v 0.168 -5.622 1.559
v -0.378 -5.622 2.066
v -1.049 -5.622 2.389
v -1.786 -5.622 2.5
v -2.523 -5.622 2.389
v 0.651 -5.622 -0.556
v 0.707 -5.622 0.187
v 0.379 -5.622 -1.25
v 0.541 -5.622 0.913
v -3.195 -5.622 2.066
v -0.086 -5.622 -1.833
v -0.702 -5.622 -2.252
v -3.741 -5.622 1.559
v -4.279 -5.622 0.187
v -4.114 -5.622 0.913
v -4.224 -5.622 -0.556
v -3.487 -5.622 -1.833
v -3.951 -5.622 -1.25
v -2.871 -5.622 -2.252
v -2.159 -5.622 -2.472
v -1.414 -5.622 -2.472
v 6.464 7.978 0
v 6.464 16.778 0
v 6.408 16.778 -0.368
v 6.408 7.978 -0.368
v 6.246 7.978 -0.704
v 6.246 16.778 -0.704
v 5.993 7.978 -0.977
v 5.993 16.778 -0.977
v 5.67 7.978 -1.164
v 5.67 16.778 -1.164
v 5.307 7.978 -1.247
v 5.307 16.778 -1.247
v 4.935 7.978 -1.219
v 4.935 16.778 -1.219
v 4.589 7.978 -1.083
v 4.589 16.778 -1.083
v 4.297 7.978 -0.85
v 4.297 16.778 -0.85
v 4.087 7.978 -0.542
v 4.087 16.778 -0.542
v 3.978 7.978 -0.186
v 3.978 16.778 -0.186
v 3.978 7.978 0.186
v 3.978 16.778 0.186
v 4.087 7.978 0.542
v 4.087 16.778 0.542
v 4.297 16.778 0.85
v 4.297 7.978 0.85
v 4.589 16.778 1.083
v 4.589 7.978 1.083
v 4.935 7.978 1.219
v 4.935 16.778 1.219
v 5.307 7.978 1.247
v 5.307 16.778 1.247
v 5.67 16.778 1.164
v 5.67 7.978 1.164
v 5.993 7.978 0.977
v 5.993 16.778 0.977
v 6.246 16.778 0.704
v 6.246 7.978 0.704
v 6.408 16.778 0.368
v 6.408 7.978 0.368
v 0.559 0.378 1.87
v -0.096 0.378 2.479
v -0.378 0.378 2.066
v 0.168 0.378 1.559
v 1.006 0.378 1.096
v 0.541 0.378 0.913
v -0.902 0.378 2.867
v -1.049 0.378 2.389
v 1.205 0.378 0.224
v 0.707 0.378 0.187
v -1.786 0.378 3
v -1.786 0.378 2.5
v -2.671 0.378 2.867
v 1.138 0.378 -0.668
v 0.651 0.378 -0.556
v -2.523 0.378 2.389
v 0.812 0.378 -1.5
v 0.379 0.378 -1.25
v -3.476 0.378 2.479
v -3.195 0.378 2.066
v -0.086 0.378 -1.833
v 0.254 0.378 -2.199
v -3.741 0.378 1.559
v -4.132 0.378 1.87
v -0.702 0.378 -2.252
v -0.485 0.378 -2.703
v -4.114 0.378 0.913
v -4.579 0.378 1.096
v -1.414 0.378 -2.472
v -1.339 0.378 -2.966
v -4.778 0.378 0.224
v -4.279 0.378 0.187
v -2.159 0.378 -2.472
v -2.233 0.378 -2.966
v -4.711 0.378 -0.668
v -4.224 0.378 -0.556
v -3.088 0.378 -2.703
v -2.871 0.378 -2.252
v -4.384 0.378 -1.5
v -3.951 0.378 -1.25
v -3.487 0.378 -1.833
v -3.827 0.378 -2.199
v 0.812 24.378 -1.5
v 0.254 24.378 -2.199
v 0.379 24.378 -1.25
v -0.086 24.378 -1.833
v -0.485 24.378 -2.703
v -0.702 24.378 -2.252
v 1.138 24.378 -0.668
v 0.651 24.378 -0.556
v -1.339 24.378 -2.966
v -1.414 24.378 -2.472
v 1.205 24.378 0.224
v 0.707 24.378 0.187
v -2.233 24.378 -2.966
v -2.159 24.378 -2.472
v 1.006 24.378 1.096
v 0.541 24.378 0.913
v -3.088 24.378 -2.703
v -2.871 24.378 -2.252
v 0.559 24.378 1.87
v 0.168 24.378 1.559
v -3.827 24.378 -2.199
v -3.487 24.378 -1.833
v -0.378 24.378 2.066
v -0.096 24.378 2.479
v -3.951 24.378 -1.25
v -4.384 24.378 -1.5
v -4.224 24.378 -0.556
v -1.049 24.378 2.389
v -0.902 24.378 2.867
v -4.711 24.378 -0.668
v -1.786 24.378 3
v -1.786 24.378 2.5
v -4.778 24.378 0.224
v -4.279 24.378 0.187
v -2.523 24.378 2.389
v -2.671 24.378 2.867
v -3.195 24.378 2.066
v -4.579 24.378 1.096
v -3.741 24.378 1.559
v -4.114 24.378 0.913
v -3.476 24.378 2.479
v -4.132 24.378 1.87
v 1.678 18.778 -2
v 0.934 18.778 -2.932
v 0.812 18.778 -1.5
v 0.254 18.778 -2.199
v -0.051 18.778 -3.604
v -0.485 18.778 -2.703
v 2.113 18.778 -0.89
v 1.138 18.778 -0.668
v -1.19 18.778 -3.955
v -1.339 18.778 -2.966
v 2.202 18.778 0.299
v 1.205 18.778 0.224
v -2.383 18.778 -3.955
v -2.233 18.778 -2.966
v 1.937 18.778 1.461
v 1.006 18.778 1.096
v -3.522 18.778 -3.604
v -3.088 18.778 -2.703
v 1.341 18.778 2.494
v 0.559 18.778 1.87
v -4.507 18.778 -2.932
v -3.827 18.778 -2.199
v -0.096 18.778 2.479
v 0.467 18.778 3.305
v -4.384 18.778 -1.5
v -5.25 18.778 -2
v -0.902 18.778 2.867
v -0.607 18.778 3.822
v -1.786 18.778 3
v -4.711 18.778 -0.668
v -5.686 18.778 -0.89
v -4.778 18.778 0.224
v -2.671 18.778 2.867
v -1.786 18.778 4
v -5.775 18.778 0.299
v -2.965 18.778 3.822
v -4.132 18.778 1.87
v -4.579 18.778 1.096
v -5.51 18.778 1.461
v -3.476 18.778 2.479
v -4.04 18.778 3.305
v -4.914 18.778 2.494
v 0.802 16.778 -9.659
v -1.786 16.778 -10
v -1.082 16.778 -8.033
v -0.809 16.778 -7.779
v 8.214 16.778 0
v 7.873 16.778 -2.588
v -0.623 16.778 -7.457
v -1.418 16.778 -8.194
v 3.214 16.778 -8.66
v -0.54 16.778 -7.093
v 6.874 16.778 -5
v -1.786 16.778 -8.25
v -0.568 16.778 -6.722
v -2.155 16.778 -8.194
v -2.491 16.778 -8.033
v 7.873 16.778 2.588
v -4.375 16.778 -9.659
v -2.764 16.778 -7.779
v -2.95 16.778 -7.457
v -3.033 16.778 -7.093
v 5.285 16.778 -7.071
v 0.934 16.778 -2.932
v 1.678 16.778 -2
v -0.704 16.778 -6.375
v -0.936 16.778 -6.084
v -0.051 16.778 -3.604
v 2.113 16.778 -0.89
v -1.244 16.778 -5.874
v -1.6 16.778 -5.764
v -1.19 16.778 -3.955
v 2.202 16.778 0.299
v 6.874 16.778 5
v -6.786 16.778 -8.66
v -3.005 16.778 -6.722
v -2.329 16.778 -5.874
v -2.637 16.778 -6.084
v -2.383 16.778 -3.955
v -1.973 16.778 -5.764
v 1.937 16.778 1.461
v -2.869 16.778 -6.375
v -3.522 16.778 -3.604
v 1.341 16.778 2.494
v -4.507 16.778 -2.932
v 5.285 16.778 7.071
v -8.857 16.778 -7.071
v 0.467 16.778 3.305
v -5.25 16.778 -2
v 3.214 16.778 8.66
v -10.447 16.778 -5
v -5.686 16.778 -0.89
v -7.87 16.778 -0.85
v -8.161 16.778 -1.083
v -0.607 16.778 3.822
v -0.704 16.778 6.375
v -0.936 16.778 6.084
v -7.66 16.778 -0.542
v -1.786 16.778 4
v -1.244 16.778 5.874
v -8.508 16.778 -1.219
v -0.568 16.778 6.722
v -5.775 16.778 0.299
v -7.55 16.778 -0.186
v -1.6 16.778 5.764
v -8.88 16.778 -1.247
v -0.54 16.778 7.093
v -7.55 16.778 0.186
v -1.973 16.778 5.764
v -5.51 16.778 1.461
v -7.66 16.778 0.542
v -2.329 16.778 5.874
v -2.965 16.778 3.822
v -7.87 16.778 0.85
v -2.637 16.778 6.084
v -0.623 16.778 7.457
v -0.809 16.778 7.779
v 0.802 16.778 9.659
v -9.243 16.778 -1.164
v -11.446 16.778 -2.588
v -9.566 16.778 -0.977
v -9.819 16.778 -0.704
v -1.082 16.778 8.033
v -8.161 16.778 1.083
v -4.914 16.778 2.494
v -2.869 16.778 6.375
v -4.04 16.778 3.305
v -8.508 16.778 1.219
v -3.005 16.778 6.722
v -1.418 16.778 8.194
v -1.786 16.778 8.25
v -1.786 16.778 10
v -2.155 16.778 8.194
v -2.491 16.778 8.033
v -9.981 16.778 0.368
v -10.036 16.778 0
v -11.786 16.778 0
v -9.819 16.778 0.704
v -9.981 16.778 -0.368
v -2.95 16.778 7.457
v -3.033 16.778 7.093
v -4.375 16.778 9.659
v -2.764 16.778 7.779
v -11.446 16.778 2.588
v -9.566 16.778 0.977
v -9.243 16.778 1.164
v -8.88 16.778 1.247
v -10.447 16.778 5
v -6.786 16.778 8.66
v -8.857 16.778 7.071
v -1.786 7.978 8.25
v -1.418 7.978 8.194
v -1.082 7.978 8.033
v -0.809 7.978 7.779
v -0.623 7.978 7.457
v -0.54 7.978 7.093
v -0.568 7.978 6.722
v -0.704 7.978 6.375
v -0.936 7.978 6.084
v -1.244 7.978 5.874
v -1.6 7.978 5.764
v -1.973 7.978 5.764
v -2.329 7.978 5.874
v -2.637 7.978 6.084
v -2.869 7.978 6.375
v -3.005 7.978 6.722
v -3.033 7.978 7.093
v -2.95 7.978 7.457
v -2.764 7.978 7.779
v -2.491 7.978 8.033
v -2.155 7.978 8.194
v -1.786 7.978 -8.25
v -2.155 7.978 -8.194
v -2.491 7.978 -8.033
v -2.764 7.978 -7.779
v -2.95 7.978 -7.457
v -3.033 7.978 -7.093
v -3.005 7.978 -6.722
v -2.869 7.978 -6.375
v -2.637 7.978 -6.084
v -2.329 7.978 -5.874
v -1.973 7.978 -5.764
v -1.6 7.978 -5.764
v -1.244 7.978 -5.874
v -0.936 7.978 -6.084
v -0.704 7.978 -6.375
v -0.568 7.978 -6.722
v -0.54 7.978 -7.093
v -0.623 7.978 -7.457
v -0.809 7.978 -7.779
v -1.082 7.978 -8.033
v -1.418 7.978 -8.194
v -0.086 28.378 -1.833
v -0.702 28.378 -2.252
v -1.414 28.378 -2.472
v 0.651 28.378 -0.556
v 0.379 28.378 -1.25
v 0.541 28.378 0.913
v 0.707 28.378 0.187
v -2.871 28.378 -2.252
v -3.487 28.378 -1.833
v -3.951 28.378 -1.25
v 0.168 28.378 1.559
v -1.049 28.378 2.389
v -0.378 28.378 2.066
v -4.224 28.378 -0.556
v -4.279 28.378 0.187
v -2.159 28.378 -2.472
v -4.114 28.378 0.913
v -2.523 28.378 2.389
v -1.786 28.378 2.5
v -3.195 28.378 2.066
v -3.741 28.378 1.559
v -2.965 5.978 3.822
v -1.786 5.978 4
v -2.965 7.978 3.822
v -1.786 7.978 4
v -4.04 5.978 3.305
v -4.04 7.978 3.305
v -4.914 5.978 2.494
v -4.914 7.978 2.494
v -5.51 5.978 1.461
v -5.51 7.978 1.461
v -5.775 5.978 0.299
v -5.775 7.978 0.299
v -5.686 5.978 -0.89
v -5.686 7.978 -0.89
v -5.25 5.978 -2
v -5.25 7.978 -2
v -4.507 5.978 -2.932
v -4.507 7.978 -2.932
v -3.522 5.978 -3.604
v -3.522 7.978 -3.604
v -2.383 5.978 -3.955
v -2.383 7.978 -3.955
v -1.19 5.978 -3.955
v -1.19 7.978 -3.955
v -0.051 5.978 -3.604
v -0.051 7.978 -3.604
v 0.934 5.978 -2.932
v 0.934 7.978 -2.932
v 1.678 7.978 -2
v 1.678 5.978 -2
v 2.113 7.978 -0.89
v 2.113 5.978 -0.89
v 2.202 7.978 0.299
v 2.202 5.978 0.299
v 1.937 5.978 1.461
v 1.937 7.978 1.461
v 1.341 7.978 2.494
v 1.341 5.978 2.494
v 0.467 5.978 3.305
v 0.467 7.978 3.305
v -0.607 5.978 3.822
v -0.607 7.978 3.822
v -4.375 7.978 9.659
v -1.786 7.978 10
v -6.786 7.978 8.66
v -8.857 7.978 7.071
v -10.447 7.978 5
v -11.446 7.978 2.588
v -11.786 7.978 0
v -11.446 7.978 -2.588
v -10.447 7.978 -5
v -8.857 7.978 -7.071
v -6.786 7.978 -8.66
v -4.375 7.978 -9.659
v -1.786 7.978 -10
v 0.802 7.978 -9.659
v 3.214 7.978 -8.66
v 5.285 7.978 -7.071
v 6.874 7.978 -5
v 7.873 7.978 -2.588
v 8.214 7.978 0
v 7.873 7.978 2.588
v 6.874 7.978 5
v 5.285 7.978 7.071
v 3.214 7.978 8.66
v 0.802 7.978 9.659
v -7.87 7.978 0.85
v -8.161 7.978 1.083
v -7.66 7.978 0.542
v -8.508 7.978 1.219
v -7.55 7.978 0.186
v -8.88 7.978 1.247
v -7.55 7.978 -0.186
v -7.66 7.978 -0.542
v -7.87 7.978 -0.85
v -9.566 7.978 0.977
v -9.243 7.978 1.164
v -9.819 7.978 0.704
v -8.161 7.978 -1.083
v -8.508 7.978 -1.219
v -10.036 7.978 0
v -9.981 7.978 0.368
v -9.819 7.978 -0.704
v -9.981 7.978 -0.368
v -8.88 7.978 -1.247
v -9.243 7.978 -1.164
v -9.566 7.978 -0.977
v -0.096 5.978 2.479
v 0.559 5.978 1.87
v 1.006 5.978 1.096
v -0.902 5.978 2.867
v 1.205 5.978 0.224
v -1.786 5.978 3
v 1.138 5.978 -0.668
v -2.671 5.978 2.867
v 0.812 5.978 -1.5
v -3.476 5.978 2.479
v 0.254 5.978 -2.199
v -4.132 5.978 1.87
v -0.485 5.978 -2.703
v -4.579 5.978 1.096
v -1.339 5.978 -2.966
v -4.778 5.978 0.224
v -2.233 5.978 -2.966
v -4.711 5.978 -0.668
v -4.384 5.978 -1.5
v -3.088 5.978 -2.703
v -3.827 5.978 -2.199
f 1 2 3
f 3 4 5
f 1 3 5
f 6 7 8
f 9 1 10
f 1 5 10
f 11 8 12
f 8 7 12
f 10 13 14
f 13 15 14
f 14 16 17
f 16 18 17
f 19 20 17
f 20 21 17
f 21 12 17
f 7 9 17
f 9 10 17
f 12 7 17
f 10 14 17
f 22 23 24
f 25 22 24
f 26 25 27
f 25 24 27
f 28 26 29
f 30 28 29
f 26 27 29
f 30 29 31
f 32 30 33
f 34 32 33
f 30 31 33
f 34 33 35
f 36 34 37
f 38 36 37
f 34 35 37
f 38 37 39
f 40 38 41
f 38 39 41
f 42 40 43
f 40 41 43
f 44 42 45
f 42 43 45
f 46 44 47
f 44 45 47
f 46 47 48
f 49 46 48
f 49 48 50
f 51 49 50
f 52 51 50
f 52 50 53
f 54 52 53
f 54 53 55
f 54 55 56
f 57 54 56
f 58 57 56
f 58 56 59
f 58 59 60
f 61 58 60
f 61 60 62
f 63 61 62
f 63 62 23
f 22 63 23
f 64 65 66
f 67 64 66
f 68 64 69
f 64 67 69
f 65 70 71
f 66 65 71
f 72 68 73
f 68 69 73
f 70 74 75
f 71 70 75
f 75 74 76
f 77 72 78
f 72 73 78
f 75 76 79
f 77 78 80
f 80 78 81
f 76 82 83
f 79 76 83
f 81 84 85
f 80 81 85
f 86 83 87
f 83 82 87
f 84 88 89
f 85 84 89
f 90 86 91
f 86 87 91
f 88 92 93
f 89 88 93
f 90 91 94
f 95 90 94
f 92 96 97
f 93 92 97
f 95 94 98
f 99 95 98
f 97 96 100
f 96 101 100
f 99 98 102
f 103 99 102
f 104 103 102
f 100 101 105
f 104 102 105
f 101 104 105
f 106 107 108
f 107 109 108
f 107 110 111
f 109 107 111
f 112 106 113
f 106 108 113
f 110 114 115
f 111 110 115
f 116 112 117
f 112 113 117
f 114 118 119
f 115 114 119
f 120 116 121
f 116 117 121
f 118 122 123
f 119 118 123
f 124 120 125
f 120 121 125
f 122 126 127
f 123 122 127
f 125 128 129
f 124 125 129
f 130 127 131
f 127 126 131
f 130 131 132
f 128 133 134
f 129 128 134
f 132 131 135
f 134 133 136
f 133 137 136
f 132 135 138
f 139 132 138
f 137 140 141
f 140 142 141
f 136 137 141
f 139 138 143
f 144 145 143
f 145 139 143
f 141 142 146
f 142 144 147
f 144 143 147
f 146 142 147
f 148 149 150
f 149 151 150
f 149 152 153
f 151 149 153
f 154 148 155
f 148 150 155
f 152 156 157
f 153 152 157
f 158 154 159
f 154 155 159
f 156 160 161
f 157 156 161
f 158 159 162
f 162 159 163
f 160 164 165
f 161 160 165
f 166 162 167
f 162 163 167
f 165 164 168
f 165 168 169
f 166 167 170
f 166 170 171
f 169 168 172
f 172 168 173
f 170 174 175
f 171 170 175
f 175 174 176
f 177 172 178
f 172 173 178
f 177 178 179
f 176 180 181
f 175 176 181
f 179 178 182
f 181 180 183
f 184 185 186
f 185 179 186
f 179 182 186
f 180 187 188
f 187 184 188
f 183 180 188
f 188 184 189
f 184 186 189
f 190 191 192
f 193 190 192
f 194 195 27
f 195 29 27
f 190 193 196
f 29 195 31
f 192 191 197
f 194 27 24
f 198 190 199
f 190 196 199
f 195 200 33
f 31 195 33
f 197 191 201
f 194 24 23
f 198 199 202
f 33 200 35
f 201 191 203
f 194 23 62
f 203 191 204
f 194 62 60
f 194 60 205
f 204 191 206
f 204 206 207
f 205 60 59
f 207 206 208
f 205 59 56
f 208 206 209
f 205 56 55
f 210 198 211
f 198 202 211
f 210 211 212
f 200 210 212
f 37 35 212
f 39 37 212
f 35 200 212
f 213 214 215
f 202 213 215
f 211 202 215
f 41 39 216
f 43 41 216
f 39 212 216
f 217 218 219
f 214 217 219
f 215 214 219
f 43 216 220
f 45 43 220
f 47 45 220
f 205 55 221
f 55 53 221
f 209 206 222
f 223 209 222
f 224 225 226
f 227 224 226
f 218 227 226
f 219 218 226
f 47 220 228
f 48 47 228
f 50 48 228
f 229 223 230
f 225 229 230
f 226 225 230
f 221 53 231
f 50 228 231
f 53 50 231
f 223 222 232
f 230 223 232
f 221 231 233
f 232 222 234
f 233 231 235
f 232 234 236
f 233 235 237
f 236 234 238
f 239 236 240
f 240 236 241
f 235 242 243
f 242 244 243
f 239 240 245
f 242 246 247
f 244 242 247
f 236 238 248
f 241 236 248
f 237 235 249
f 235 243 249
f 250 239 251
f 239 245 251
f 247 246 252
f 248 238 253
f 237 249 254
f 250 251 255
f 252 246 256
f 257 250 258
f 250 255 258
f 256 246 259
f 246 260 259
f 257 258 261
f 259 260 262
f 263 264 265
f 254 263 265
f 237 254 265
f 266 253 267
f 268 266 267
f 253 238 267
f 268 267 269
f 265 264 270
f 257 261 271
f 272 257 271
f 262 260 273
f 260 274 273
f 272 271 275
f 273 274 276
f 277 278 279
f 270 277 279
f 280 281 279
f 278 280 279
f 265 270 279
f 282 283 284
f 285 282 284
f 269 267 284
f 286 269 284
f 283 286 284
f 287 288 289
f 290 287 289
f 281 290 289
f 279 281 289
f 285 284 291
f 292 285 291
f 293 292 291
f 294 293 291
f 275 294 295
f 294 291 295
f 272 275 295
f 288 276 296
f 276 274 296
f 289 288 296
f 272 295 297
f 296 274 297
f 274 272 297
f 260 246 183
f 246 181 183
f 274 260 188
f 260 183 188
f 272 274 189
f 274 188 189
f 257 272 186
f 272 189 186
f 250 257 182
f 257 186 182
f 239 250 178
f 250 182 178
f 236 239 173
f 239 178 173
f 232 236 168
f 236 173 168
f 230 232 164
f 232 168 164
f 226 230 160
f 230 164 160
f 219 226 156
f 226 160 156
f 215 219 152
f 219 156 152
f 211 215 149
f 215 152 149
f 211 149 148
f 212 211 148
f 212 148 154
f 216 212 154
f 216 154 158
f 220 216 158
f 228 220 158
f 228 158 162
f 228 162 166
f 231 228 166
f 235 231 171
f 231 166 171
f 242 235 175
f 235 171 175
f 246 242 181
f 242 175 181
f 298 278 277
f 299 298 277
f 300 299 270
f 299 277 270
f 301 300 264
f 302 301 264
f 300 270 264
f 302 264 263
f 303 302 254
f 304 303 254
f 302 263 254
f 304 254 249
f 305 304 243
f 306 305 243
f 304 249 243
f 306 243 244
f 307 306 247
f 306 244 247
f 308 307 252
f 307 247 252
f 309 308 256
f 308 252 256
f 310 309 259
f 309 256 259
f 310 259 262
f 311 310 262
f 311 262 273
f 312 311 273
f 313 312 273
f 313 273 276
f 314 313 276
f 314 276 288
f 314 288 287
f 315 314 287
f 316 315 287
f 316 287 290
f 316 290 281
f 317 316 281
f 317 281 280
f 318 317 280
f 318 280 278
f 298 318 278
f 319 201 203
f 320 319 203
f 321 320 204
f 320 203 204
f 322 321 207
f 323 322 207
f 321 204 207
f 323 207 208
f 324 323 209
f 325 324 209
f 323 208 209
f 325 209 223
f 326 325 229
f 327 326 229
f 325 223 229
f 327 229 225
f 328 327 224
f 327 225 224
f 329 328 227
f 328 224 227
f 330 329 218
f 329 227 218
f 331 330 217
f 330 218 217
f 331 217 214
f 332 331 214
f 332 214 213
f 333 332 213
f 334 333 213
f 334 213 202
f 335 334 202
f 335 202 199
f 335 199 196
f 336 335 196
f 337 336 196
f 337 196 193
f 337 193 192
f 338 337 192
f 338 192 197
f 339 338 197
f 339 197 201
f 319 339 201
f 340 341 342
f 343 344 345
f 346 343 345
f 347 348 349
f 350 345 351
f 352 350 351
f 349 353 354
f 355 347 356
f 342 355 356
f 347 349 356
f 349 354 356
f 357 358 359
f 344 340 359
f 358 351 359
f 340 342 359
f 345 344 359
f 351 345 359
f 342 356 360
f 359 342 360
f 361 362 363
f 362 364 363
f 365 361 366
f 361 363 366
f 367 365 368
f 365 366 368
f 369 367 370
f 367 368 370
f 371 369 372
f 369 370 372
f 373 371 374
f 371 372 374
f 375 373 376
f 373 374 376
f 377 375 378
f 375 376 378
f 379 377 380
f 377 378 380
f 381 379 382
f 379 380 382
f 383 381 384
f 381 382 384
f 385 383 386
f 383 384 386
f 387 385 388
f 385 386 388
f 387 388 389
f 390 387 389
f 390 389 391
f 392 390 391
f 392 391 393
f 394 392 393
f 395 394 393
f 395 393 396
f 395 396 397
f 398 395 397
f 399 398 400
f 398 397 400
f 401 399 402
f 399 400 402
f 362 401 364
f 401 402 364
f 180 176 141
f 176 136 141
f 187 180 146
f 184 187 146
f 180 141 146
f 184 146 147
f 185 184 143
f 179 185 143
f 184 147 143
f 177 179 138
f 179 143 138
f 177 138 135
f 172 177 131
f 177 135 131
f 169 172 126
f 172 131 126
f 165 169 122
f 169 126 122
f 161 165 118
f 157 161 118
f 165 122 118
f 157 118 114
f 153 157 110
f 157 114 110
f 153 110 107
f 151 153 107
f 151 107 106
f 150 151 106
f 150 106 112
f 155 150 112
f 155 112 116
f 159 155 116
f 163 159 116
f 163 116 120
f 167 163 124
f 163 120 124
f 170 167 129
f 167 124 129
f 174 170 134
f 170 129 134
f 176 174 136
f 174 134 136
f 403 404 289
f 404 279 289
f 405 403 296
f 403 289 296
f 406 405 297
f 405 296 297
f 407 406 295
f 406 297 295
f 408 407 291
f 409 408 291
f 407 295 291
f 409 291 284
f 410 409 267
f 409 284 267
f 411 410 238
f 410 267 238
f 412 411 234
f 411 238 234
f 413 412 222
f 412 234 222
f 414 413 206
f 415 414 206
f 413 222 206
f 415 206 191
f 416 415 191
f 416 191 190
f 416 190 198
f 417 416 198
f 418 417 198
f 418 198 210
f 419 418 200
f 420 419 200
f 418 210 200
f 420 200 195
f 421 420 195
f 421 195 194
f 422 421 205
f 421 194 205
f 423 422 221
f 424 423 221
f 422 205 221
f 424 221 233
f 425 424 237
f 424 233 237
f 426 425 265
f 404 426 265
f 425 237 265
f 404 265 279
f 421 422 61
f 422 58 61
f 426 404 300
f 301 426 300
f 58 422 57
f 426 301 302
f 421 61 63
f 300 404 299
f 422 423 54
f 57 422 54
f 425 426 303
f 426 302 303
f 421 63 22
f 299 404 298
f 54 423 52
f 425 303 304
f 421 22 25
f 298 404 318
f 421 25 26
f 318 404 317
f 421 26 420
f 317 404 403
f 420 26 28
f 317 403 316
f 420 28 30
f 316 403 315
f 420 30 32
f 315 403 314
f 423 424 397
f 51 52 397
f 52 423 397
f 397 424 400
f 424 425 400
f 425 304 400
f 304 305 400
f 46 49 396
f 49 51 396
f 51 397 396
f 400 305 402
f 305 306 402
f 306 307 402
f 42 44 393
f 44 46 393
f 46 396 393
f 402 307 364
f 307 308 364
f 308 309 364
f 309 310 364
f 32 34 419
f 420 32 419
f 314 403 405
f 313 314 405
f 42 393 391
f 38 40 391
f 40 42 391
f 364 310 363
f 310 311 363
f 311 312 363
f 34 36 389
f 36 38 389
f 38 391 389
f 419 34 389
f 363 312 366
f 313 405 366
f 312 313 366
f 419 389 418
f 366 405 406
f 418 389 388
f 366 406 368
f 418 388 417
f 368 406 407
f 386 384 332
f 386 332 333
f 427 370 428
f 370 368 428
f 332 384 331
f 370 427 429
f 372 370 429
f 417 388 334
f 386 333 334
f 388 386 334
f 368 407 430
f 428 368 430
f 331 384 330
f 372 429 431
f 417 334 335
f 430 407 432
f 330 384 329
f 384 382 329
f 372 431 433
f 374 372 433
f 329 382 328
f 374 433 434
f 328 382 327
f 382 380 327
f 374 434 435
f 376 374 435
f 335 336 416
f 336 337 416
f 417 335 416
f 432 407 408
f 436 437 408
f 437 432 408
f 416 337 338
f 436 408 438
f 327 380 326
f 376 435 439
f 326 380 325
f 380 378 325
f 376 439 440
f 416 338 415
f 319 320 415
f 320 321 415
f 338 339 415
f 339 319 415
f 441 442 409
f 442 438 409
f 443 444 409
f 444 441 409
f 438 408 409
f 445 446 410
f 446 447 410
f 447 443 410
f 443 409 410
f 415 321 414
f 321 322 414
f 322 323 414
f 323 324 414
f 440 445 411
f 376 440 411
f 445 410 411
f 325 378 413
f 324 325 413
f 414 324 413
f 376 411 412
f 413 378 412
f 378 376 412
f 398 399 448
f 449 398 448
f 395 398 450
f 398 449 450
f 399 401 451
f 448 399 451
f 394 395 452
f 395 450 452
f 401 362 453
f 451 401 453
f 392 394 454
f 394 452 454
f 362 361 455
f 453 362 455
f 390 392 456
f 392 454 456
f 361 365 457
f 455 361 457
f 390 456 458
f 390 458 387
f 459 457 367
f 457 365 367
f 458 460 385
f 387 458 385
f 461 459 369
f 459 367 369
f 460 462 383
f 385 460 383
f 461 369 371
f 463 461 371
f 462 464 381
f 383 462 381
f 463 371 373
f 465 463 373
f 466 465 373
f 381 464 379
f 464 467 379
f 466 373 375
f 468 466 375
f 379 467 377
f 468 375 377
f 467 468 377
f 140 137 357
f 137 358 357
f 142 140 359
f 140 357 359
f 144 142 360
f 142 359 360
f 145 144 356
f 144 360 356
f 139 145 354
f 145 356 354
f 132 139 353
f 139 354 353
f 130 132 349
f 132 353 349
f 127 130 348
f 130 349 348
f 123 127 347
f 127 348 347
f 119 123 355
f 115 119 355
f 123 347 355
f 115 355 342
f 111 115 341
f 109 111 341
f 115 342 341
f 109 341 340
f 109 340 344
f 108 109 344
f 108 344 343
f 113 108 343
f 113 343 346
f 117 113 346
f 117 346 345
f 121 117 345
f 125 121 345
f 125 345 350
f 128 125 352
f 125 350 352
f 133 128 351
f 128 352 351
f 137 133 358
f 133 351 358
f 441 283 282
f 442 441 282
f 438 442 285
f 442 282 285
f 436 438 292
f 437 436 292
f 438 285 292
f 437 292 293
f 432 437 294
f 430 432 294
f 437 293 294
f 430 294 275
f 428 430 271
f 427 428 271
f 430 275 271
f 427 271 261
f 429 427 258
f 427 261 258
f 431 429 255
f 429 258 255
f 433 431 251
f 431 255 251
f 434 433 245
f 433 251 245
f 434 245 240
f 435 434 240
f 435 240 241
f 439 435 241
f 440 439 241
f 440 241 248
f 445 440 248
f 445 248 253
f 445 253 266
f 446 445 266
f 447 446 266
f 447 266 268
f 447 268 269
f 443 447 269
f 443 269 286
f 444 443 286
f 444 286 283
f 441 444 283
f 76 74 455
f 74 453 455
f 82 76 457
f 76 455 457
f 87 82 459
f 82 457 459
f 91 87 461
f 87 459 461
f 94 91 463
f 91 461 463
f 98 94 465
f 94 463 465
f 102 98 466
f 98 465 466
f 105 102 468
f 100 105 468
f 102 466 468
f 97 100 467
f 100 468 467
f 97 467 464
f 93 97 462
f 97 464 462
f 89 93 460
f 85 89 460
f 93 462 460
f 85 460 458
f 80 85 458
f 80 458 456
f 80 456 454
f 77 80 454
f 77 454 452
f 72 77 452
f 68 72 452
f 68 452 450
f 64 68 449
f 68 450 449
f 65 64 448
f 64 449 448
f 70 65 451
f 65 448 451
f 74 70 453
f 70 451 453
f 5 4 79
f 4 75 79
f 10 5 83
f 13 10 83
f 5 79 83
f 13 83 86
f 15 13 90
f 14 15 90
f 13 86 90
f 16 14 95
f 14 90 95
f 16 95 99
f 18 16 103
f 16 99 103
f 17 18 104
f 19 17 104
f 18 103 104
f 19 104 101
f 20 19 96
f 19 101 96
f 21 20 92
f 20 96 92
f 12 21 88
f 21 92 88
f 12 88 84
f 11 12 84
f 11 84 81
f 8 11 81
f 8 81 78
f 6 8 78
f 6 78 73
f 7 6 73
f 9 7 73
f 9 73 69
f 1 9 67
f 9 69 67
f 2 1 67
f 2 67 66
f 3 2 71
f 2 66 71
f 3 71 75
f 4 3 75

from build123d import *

# Parameters (mm, degrees)
HOLE_WIZARD_M3_1_D       = 2.5
PATTERN_CIRCULAR_1_COUNT = 4


with BuildPart() as part:
    # Model → 旋转1 (revolve)
    with BuildSketch(Plane.XY, mode=Mode.PRIVATE) as revolve_1_sk:
        Polygon((-1.786351506, 28.377960803), (-1.786351506, -5.622039197), (0.713648494, -5.622039197), (0.713648494, 0.377960803), (1.213648494, 0.377960803), (1.213648494, 5.977960803), (2.213648494, 5.977960803), (2.213648494, 7.977960803), (8.213648494, 7.977960803), (8.213648494, 16.777960803), (2.213648494, 16.777960803), (2.213648494, 18.777960803), (1.213648494, 18.777960803), (1.213648494, 24.377960803), (0.713648494, 24.377960803), (0.713648494, 28.377960803), align=None)
    revolve(revolve_1_sk.sketch.rotate(Axis((-1.786351506, 28.377960803, 0), (0, -1, 0)), 90), axis=Axis((-1.786351506, 28.377960803, 0), (0, -1, 0)))

    # M3 螺纹孔1 (through all)
    with Locations(Plane(origin=(-1.786351506, 7.977960803, 7), x_dir=(0, 0, -1), z_dir=(0, -1, 0))):
        with Locations((0, 0)):
            hole_wizard_m3_1 = Hole(HOLE_WIZARD_M3_1_D / 2)

    # 阵列(圆周)1: M3 螺纹孔1 ×4 about axis
    pattern_circular_1_axis = Axis((-1.786351506, 0, 0), (0, 1, 0))
    for i in range(1, PATTERN_CIRCULAR_1_COUNT):
        add(hole_wizard_m3_1.rotate(pattern_circular_1_axis, i * 360 / PATTERN_CIRCULAR_1_COUNT), mode=Mode.SUBTRACT)


solid = part.part
